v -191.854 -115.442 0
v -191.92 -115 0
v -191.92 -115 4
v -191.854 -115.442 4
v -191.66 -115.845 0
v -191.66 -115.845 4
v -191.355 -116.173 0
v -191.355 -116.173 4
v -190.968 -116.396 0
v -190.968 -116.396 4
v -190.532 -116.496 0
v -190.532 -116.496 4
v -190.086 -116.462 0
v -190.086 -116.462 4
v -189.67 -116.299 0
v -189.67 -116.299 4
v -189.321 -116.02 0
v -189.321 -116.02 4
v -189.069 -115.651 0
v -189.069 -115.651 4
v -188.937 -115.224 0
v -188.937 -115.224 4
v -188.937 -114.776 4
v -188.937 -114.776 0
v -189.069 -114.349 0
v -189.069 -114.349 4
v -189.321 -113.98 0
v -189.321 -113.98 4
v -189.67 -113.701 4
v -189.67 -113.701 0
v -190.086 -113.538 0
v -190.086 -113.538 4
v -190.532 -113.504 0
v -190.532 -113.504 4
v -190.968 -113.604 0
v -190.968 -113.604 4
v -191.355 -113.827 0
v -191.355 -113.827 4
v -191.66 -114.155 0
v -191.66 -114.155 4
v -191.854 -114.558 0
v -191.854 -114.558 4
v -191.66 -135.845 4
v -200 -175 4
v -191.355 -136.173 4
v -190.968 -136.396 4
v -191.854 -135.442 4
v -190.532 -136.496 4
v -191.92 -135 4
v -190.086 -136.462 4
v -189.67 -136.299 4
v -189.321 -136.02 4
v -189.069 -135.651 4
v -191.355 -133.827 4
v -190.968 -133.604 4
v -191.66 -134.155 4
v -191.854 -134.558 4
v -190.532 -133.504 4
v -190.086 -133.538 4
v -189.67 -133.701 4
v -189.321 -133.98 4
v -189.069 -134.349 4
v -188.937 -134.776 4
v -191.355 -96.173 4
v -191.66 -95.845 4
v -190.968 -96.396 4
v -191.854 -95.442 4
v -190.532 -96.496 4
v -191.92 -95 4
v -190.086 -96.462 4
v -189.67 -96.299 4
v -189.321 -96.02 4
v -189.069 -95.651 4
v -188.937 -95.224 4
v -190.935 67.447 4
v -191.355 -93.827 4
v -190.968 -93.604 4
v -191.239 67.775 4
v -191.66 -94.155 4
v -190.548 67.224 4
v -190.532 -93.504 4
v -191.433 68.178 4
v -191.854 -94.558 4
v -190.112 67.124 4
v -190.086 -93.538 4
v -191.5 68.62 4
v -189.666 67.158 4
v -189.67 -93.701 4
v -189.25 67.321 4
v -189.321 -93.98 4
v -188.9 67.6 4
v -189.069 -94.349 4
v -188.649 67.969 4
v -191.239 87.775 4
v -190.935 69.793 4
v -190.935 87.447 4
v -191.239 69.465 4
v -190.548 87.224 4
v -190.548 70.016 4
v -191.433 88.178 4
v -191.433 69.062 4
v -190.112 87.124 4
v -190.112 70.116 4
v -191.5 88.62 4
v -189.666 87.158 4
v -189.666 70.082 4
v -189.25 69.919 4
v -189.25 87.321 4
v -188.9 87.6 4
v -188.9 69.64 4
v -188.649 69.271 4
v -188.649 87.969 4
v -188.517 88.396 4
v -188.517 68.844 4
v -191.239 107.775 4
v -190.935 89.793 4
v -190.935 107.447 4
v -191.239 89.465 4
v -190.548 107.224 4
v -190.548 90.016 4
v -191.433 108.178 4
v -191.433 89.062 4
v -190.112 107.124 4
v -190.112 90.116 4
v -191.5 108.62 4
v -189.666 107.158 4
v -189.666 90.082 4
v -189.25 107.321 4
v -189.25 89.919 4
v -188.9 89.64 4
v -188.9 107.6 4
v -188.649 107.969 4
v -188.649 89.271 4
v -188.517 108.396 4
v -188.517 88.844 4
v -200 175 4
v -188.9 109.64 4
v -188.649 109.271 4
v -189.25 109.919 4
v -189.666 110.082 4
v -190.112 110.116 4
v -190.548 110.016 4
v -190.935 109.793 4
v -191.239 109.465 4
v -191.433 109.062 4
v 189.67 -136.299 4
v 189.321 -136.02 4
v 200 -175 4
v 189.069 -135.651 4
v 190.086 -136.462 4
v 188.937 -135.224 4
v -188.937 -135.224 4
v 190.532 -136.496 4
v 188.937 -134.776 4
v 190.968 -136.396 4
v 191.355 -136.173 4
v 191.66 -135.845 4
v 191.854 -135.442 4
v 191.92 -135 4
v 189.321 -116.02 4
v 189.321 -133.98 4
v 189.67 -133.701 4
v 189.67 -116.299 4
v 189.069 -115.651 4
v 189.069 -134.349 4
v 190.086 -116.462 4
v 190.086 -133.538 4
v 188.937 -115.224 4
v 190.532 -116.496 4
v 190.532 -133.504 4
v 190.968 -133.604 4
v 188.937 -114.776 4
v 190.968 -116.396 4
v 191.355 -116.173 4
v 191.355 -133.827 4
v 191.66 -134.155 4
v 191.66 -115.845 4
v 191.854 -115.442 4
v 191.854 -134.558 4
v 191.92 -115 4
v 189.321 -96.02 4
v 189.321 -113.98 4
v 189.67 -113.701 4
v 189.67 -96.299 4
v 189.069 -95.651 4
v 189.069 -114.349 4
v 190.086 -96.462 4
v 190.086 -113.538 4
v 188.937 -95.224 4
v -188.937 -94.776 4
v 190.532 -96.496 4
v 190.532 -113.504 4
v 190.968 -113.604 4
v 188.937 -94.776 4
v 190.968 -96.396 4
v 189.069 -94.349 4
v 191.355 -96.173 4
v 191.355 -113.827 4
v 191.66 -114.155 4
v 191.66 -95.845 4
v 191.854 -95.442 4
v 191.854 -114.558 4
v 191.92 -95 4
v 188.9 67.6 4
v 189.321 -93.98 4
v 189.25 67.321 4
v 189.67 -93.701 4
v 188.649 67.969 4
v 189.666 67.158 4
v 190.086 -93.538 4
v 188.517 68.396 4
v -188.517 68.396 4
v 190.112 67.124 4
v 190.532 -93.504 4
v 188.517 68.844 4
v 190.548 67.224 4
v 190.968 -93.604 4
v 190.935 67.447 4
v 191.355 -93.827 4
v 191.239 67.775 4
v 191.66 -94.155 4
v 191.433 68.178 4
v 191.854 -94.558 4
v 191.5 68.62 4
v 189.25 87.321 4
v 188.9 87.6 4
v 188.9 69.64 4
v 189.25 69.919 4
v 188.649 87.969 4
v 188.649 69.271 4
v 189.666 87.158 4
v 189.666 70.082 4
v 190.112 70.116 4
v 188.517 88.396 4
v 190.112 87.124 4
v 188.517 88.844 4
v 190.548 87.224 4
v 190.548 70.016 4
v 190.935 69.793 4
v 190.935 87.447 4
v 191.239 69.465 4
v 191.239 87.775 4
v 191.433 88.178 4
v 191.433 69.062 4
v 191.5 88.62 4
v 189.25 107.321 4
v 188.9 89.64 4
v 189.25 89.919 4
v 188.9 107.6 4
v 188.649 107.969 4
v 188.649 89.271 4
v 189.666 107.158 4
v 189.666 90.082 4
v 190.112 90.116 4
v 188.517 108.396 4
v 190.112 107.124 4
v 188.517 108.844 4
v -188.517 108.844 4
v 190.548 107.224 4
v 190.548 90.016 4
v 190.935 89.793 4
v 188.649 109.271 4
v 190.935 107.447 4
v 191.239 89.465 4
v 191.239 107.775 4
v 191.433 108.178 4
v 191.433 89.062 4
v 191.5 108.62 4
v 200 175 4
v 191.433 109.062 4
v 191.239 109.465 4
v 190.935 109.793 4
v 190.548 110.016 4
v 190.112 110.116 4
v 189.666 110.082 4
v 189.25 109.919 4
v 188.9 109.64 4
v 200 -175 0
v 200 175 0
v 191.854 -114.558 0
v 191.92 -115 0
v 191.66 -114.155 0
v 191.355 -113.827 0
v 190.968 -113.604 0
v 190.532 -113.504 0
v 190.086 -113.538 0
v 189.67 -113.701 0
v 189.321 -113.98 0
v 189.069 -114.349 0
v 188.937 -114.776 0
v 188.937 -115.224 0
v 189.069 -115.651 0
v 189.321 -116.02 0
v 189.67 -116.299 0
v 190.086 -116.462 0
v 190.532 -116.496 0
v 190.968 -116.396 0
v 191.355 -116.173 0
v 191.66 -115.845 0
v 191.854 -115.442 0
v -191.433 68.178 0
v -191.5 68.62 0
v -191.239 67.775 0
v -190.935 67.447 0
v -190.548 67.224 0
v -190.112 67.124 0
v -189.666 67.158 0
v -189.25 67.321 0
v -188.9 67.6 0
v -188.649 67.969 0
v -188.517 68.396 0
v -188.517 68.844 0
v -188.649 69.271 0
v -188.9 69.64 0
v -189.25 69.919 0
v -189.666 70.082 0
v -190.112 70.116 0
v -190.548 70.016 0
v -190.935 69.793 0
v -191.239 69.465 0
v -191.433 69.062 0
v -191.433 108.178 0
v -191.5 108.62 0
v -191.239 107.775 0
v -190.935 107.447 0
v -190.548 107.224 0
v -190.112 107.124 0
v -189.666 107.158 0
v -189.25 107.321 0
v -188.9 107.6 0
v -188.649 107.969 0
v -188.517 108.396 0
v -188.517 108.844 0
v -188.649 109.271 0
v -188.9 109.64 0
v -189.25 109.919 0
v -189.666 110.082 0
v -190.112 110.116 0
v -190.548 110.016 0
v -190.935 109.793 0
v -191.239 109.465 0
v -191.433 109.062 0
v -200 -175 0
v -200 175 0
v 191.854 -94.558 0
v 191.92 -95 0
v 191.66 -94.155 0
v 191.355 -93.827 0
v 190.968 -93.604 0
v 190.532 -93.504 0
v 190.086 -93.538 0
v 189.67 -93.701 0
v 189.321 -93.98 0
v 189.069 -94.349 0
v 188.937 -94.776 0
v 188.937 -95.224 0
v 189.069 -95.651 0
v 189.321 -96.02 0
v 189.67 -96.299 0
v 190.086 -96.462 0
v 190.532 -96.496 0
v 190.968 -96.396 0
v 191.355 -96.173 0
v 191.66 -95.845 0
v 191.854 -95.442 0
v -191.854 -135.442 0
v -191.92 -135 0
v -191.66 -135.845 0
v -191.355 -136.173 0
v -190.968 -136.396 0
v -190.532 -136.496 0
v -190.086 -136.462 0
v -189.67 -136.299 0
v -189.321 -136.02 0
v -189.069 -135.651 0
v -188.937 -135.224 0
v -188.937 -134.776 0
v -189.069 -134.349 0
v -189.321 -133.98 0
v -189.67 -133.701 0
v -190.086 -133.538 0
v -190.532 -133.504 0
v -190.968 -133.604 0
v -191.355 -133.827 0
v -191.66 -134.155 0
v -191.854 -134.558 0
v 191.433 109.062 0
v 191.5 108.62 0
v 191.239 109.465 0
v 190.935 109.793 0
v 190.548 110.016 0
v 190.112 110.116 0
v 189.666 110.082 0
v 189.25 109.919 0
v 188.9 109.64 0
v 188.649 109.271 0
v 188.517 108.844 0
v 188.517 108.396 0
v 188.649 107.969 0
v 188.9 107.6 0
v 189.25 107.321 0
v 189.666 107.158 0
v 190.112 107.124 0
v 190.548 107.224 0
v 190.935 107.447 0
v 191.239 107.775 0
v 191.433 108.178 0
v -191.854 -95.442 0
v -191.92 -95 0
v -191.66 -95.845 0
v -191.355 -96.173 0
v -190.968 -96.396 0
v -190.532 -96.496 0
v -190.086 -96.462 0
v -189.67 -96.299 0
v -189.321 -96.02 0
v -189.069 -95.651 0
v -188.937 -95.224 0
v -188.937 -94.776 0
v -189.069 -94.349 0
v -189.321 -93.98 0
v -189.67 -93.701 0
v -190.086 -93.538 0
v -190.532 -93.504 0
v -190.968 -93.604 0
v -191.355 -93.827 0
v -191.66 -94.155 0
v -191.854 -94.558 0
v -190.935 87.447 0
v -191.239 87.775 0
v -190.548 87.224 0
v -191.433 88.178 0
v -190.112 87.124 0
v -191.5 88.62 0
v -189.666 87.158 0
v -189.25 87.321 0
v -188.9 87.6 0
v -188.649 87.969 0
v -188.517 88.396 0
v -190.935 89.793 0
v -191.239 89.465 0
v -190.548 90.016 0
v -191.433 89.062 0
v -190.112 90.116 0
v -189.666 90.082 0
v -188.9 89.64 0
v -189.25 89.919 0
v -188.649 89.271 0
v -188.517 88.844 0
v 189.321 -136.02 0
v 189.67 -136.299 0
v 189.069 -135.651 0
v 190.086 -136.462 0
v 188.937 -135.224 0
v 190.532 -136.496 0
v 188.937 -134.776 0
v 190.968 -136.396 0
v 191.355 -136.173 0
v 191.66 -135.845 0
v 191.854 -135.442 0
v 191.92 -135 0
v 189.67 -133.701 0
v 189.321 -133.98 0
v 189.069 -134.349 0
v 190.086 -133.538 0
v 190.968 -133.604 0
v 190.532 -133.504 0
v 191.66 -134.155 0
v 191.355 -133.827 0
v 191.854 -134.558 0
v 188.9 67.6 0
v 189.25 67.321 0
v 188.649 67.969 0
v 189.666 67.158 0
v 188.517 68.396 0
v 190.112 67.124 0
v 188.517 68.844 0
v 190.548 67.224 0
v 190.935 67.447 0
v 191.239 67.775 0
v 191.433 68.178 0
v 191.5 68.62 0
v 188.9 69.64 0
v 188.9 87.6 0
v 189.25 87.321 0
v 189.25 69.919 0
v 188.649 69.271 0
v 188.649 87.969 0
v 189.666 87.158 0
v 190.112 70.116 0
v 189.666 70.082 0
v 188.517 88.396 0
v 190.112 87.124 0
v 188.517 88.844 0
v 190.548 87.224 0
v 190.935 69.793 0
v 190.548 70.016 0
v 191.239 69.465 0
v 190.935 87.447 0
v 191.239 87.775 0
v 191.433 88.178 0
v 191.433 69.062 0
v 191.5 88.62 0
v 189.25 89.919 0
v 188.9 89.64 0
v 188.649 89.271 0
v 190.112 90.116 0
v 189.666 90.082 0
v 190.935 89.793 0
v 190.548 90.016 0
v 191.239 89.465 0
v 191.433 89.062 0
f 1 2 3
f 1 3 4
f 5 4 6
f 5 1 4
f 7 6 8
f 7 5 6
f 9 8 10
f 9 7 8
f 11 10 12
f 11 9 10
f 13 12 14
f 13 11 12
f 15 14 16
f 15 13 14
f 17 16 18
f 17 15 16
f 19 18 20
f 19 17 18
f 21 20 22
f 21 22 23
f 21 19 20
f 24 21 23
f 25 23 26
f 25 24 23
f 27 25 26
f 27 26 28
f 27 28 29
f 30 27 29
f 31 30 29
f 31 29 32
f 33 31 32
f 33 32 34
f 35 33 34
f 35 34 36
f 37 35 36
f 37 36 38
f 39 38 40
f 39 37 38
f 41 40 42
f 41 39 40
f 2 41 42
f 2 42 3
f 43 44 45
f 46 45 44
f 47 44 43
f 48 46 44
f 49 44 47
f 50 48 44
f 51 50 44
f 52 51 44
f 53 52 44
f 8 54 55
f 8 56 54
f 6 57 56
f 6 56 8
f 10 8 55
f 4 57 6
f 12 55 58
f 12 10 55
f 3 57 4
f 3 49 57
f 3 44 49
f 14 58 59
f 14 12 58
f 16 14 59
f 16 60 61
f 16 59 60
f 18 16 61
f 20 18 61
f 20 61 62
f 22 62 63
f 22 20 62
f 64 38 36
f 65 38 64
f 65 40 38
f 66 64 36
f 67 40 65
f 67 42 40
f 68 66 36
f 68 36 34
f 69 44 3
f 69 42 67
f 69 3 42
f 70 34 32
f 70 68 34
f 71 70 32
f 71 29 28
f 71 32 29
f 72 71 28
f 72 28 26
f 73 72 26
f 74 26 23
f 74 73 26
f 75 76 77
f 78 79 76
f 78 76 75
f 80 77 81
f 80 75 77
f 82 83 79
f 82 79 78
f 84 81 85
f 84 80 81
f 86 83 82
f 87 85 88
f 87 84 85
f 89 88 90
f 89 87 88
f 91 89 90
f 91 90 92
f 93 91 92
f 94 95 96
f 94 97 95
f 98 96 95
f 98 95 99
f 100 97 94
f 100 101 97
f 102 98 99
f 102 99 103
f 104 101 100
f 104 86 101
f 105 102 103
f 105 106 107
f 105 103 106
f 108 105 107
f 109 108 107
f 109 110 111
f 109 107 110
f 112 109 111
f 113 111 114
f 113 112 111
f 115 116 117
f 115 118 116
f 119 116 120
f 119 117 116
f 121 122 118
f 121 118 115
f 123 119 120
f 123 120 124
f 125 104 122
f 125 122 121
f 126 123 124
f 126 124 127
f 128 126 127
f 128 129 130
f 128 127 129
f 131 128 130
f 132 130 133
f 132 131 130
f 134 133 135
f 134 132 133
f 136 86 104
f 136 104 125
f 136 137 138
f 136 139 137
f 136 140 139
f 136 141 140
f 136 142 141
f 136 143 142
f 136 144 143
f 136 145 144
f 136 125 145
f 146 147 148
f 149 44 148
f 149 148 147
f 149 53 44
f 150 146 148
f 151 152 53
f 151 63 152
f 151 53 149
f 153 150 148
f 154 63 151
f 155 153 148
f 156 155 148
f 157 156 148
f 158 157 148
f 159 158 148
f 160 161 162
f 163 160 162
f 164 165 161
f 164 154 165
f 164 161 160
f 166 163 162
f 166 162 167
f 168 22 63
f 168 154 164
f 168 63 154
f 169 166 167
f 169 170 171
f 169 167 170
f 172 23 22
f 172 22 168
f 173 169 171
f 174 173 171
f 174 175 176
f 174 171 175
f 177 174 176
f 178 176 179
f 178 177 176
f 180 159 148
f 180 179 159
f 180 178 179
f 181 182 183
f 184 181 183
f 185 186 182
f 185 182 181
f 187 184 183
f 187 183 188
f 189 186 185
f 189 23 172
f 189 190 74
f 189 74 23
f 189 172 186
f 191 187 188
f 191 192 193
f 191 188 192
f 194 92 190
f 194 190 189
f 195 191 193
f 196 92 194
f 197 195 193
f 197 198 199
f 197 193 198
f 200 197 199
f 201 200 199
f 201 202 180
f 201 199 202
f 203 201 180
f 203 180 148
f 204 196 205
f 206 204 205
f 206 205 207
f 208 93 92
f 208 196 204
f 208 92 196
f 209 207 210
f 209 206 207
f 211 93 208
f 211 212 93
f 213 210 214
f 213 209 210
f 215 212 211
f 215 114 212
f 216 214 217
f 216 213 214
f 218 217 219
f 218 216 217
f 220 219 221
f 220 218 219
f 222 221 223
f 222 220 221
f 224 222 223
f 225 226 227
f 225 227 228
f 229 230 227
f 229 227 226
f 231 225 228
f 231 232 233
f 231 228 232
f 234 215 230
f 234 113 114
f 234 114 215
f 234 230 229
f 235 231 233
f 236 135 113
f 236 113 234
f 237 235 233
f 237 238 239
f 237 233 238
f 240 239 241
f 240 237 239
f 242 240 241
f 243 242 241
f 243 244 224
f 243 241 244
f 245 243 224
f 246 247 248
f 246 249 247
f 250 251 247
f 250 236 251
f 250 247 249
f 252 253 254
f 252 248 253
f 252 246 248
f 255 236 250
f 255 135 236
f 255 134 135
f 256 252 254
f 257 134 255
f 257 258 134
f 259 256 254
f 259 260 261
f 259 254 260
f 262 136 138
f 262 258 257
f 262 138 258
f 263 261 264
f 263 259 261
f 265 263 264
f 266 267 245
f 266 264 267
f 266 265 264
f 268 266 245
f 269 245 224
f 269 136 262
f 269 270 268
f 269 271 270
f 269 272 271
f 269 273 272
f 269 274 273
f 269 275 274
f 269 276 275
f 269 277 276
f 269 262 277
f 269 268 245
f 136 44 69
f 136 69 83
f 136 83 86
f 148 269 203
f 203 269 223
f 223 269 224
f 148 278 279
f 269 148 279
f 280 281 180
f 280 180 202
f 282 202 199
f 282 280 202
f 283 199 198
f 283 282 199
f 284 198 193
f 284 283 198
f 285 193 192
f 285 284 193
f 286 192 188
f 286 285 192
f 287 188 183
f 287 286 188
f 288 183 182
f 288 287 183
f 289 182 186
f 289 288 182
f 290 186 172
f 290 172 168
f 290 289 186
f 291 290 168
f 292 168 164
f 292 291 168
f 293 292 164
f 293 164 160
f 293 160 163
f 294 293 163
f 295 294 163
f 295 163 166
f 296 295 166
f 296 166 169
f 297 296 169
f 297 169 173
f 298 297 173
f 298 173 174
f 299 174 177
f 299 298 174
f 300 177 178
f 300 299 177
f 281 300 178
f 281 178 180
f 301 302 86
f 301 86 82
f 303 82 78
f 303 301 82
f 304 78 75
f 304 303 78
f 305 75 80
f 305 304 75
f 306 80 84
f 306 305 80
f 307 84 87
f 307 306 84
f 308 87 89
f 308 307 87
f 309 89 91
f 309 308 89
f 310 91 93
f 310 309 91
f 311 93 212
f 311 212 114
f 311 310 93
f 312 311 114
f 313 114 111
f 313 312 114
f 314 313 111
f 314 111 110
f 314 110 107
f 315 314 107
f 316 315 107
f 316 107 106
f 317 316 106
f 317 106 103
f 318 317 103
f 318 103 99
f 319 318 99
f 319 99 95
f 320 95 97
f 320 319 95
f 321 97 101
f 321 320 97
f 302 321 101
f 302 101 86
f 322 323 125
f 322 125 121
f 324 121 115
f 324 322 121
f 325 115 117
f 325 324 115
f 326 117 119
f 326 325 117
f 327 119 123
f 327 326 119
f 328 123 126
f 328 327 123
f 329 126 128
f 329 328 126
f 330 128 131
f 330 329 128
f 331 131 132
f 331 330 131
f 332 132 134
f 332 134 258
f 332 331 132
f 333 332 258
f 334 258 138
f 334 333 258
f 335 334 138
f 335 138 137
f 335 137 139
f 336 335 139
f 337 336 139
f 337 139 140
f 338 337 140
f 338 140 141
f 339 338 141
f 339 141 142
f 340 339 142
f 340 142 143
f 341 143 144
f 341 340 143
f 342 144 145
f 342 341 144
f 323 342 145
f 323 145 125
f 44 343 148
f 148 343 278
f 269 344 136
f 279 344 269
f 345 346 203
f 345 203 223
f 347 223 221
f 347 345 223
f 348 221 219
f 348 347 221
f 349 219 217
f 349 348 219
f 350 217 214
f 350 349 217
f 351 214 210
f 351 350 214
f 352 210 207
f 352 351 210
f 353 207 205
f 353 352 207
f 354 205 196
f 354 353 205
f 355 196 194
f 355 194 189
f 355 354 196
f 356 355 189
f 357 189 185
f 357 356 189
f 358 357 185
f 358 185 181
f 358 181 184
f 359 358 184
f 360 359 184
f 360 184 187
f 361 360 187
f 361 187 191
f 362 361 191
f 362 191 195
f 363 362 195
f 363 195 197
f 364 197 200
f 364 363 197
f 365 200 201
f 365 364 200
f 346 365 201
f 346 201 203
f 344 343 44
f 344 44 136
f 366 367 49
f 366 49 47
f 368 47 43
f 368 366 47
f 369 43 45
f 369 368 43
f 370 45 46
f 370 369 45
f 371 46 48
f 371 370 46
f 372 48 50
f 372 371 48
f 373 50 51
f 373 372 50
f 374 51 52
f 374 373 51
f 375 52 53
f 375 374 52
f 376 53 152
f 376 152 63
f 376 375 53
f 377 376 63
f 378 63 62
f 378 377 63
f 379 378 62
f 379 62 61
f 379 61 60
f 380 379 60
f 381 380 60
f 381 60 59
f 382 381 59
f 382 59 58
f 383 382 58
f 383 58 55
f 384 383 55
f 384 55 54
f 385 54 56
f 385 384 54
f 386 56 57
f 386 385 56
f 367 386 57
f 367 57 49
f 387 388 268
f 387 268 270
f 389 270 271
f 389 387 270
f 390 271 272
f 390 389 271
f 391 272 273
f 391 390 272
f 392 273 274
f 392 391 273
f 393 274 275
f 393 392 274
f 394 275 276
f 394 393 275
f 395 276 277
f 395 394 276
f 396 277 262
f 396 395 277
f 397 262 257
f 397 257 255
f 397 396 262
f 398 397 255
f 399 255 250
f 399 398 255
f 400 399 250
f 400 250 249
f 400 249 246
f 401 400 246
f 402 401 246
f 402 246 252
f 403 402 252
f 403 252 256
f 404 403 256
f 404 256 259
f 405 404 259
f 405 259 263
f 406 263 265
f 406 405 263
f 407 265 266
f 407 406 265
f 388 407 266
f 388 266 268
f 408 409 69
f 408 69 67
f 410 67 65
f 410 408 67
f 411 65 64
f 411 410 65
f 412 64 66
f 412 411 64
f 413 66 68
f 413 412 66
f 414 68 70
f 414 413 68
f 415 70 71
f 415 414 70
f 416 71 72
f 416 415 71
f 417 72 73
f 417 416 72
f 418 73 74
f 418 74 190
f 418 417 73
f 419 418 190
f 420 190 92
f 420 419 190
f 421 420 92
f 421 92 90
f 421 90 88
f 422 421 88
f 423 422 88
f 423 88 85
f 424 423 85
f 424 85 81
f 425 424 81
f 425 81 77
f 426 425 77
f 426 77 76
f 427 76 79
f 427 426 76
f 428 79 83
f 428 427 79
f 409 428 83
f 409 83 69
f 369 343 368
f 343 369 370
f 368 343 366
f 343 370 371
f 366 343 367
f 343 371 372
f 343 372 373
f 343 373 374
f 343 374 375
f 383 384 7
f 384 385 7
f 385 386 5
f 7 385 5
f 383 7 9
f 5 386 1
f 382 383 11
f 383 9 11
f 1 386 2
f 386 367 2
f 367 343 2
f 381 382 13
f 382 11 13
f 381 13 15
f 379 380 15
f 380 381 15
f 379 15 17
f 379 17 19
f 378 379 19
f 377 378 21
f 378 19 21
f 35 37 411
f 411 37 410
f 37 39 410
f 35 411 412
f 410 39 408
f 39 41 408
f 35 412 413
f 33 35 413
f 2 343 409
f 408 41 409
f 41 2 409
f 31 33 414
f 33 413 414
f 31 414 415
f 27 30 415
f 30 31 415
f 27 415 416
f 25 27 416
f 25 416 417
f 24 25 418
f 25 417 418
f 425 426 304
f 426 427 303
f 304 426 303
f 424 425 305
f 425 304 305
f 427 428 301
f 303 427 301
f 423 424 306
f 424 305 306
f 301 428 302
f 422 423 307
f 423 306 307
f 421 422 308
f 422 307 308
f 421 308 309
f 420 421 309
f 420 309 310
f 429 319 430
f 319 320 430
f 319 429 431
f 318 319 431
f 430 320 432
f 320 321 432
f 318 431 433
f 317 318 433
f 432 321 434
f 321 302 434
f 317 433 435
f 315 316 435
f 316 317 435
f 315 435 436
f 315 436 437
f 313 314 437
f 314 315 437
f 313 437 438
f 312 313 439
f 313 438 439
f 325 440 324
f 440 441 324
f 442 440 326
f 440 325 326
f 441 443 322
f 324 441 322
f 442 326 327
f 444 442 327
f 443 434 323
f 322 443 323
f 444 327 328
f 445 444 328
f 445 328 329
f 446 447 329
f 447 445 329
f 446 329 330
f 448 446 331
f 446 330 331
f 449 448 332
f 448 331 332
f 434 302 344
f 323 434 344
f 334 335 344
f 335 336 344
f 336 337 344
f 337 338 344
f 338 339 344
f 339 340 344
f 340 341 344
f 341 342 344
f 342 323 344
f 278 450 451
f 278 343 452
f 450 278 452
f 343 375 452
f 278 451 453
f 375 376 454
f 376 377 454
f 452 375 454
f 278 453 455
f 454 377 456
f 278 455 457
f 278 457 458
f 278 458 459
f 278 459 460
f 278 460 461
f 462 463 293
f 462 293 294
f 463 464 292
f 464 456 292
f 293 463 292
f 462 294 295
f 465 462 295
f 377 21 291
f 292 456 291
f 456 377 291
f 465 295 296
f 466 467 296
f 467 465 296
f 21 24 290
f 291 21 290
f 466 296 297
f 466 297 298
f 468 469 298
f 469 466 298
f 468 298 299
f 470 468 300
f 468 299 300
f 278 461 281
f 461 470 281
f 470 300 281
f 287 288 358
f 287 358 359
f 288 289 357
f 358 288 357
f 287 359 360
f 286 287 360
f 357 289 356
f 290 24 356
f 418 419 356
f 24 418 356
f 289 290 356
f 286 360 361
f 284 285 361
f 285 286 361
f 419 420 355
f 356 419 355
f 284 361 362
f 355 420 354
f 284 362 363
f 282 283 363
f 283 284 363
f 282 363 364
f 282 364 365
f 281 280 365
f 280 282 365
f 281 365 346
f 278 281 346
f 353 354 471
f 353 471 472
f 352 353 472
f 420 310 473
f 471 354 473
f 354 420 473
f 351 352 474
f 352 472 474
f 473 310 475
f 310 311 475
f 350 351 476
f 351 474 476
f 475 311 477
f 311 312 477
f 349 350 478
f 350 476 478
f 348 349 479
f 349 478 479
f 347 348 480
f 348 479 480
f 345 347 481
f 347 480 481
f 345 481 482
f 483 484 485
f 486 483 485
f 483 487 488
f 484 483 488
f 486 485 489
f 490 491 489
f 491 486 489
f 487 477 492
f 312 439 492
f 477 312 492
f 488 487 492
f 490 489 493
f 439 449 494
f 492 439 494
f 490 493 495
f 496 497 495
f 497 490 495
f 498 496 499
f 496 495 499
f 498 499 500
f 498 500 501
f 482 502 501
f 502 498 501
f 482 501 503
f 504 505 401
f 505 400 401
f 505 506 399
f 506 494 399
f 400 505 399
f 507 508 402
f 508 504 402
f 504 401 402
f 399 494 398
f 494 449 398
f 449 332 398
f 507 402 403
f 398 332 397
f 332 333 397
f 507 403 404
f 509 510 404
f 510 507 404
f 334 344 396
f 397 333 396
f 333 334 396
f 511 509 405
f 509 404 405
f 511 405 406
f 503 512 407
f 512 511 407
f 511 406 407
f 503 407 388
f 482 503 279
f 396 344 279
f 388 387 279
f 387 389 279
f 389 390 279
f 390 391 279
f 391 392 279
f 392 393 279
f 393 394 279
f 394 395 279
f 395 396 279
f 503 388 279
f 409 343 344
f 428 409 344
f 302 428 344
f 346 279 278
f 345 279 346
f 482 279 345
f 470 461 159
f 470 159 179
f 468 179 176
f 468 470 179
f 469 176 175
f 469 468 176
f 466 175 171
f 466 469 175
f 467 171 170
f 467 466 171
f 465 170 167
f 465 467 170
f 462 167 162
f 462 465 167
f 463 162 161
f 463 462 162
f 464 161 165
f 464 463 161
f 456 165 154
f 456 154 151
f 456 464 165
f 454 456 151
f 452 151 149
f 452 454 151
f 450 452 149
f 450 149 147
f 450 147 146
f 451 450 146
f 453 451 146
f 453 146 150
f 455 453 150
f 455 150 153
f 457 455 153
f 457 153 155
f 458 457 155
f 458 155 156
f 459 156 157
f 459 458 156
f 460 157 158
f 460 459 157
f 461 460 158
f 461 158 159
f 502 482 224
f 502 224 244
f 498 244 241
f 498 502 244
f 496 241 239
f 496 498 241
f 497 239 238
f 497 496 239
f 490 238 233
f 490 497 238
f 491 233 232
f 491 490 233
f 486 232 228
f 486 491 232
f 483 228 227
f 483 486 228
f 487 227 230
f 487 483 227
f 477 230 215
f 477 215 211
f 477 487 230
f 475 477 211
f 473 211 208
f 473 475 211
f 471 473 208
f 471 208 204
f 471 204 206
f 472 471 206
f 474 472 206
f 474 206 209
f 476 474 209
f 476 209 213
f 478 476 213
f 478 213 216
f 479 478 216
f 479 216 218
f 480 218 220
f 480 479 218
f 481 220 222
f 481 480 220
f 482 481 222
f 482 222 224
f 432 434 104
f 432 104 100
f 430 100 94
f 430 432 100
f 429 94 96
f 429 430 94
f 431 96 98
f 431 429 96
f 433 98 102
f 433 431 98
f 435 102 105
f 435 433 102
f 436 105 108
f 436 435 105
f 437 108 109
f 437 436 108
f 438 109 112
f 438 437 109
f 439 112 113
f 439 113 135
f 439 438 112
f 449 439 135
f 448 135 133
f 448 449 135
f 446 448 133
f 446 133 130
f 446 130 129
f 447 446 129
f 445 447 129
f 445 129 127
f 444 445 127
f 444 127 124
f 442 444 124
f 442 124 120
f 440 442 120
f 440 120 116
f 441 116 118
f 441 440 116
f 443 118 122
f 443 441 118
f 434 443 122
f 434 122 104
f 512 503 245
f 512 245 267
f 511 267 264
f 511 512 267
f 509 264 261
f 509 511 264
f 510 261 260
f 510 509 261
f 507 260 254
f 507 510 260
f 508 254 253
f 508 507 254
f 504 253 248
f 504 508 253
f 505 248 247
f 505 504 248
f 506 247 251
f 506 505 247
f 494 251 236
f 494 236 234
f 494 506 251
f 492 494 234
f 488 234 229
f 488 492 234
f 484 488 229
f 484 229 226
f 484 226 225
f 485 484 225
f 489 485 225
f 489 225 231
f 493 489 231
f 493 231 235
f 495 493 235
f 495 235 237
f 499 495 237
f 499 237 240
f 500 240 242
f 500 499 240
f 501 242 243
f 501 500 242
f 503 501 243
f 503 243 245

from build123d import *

# Parameters (mm, degrees)
SKETCH1_W           = 400
SKETCH1_H           = 350
SKETCH1_R           = 1.5
BOSS_EXTRUDE1_DEPTH = 4


with BuildPart() as part:
    # Sketch1 → Boss-Extrude1 (new body)
    with BuildSketch(Plane.XY):
        Rectangle(SKETCH1_W, SKETCH1_H)
        with Locations((190.420210886, -135)):
            Circle(SKETCH1_R, mode=Mode.SUBTRACT)
        with Locations((190.420210886, -115)):
            Circle(SKETCH1_R, mode=Mode.SUBTRACT)
        with Locations((190.420210886, -95)):
            Circle(SKETCH1_R, mode=Mode.SUBTRACT)
        with Locations((190, 68.62)):
            Circle(SKETCH1_R, mode=Mode.SUBTRACT)
        with Locations((190, 88.62)):
            Circle(SKETCH1_R, mode=Mode.SUBTRACT)
        with Locations((190, 108.62)):
            Circle(SKETCH1_R, mode=Mode.SUBTRACT)
        with Locations(Location((-190.420210886, -135, 0), (0, 0, 180))):
            Circle(SKETCH1_R, mode=Mode.SUBTRACT)
        with Locations(Location((-190.420210886, -95, 0), (0, 0, 180))):
            Circle(SKETCH1_R, mode=Mode.SUBTRACT)
        with Locations(Location((-190.420210886, -115, 0), (0, 0, 180))):
            Circle(SKETCH1_R, mode=Mode.SUBTRACT)
        with Locations(Location((-190, 68.62, 0), (0, 0, 180))):
            Circle(SKETCH1_R, mode=Mode.SUBTRACT)
        with Locations(Location((-190, 88.62, 0), (0, 0, 180))):
            Circle(SKETCH1_R, mode=Mode.SUBTRACT)
        with Locations(Location((-190, 108.62, 0), (0, 0, 180))):
            Circle(SKETCH1_R, mode=Mode.SUBTRACT)
    extrude(amount=BOSS_EXTRUDE1_DEPTH)


solid = part.part
